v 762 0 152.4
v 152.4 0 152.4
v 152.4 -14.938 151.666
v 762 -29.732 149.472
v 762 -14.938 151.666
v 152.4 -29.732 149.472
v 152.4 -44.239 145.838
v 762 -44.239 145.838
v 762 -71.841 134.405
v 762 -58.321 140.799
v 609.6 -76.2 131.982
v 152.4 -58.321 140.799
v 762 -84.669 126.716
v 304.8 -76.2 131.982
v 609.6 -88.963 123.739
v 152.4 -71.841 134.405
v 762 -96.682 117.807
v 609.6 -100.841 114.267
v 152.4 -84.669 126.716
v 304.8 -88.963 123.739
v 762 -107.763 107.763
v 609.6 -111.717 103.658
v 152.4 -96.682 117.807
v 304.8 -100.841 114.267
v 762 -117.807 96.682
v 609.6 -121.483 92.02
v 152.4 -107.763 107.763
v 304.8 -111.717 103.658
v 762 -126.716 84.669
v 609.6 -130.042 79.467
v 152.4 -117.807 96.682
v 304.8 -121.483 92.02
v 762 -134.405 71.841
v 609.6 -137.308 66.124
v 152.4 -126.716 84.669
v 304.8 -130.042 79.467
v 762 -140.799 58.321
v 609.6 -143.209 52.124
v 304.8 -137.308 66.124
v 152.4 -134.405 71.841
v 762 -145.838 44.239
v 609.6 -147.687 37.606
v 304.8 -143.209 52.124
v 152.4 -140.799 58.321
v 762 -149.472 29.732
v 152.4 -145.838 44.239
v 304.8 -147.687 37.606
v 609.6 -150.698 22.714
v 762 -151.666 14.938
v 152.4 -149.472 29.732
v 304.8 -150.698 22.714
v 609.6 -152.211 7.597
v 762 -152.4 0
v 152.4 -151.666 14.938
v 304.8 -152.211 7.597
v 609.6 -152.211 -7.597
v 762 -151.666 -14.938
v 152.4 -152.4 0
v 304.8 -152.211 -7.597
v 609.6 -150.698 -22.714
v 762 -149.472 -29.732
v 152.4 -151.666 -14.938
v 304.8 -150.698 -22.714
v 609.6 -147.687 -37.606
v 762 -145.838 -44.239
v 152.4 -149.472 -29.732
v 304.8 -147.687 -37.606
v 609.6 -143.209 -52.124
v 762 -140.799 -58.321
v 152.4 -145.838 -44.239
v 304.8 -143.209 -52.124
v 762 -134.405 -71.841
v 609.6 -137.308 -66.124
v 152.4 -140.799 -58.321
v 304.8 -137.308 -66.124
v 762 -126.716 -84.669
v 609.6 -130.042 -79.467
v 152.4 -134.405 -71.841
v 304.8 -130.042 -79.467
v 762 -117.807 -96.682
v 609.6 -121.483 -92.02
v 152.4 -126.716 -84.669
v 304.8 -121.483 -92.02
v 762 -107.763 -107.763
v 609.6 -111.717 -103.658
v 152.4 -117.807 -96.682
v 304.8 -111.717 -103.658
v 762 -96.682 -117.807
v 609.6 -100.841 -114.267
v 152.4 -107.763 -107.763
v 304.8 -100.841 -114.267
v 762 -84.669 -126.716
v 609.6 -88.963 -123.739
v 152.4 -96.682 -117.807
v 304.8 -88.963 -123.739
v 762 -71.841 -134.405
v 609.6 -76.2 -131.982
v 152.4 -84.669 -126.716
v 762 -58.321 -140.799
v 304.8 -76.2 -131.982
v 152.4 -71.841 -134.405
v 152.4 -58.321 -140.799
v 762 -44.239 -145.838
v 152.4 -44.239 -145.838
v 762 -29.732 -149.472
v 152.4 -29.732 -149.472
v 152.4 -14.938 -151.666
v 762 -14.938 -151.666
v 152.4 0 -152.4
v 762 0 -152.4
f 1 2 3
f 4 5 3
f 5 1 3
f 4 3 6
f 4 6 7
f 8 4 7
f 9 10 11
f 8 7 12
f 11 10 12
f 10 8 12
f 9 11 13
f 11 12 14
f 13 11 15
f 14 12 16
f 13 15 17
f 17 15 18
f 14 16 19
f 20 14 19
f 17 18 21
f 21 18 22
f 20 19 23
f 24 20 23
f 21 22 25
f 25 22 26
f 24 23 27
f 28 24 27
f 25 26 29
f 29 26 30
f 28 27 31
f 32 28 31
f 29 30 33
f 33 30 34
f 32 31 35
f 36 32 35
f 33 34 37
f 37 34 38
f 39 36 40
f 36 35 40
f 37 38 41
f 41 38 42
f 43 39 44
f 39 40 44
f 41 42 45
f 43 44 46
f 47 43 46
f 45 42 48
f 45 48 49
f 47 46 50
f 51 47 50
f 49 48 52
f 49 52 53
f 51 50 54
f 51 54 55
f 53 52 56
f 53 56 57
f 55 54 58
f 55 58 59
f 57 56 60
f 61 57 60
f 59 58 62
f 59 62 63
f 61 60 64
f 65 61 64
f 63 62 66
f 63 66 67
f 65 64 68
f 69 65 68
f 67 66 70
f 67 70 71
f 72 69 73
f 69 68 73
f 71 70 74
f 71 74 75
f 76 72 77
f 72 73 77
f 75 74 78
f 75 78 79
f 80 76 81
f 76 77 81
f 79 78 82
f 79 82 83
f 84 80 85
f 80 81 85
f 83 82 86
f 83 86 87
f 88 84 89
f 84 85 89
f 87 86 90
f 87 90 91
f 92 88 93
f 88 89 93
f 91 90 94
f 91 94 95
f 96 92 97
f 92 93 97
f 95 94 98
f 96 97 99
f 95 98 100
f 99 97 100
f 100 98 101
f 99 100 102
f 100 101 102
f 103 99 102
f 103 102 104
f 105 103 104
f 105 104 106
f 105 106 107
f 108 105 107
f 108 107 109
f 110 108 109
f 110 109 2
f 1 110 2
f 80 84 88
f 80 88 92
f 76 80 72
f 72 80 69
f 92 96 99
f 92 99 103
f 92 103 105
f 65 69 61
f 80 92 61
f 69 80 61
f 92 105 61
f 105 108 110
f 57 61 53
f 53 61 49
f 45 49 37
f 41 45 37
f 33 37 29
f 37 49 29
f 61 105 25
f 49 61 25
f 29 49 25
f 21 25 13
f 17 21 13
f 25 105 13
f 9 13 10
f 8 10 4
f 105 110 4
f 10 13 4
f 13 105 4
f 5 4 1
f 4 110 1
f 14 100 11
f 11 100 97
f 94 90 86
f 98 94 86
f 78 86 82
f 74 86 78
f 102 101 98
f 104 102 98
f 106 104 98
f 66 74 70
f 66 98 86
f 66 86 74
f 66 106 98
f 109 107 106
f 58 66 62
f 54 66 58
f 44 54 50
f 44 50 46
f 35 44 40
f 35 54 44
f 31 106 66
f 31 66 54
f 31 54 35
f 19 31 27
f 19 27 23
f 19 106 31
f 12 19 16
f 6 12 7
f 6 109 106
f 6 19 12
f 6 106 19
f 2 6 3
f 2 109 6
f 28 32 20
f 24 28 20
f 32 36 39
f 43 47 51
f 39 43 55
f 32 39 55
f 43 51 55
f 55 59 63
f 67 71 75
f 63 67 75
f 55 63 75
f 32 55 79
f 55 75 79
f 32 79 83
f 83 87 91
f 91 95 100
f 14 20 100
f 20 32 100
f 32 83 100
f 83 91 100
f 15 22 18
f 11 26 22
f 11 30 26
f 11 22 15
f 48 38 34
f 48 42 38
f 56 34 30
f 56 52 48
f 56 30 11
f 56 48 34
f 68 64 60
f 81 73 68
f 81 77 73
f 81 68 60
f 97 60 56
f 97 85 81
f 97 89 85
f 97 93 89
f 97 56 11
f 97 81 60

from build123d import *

# Parameters (mm, degrees)
BASE_DEPTH      = 914.4
SLOT_DEPTH      = 940.456694052
SLOT_DEPTH_BACK = 940.456694052
SKETCH2_W       = 304.8
SKETCH2_H       = 76.2
LEFT_CUT_DEPTH  = 152.4


with BuildPart() as part:
    # Sketch1 → Base (new body)
    with BuildSketch(Plane(origin=(0, 0, 0), x_dir=(0, 0, -1), z_dir=(1, 0, 0))):
        with BuildLine():
            Line((152.4, 0), (-152.4, 0))
            ThreePointArc((-152.4, 0), (0, -152.4), (152.4, 0))
        make_face()
    extrude(amount=BASE_DEPTH)

    # Sketch2 → Slot (cut, two sides: drawn at the far end of the back side and taken through both)
    with BuildSketch(Plane.XY.offset(-SLOT_DEPTH_BACK)):
        with Locations((457.2, -114.3)):
            Rectangle(SKETCH2_W, SKETCH2_H)
    extrude(amount=SLOT_DEPTH + SLOT_DEPTH_BACK, mode=Mode.SUBTRACT)

    # Sketch3 → Left Cut (cut)
    with BuildSketch(Plane.ZY):
        with BuildLine():
            Line((152.4, 0), (-152.4, 0))
            ThreePointArc((-152.4, 0), (0, -152.4), (152.4, 0))
        make_face()
    left_cut = extrude(amount=-LEFT_CUT_DEPTH, mode=Mode.SUBTRACT)

    # Right Cut: Left Cut across plane
    add(left_cut.mirror(Plane(origin=(457.2, 0, 0), x_dir=(0, 0, 1), z_dir=(1, 0, 0))), mode=Mode.SUBTRACT)


solid = part.part
